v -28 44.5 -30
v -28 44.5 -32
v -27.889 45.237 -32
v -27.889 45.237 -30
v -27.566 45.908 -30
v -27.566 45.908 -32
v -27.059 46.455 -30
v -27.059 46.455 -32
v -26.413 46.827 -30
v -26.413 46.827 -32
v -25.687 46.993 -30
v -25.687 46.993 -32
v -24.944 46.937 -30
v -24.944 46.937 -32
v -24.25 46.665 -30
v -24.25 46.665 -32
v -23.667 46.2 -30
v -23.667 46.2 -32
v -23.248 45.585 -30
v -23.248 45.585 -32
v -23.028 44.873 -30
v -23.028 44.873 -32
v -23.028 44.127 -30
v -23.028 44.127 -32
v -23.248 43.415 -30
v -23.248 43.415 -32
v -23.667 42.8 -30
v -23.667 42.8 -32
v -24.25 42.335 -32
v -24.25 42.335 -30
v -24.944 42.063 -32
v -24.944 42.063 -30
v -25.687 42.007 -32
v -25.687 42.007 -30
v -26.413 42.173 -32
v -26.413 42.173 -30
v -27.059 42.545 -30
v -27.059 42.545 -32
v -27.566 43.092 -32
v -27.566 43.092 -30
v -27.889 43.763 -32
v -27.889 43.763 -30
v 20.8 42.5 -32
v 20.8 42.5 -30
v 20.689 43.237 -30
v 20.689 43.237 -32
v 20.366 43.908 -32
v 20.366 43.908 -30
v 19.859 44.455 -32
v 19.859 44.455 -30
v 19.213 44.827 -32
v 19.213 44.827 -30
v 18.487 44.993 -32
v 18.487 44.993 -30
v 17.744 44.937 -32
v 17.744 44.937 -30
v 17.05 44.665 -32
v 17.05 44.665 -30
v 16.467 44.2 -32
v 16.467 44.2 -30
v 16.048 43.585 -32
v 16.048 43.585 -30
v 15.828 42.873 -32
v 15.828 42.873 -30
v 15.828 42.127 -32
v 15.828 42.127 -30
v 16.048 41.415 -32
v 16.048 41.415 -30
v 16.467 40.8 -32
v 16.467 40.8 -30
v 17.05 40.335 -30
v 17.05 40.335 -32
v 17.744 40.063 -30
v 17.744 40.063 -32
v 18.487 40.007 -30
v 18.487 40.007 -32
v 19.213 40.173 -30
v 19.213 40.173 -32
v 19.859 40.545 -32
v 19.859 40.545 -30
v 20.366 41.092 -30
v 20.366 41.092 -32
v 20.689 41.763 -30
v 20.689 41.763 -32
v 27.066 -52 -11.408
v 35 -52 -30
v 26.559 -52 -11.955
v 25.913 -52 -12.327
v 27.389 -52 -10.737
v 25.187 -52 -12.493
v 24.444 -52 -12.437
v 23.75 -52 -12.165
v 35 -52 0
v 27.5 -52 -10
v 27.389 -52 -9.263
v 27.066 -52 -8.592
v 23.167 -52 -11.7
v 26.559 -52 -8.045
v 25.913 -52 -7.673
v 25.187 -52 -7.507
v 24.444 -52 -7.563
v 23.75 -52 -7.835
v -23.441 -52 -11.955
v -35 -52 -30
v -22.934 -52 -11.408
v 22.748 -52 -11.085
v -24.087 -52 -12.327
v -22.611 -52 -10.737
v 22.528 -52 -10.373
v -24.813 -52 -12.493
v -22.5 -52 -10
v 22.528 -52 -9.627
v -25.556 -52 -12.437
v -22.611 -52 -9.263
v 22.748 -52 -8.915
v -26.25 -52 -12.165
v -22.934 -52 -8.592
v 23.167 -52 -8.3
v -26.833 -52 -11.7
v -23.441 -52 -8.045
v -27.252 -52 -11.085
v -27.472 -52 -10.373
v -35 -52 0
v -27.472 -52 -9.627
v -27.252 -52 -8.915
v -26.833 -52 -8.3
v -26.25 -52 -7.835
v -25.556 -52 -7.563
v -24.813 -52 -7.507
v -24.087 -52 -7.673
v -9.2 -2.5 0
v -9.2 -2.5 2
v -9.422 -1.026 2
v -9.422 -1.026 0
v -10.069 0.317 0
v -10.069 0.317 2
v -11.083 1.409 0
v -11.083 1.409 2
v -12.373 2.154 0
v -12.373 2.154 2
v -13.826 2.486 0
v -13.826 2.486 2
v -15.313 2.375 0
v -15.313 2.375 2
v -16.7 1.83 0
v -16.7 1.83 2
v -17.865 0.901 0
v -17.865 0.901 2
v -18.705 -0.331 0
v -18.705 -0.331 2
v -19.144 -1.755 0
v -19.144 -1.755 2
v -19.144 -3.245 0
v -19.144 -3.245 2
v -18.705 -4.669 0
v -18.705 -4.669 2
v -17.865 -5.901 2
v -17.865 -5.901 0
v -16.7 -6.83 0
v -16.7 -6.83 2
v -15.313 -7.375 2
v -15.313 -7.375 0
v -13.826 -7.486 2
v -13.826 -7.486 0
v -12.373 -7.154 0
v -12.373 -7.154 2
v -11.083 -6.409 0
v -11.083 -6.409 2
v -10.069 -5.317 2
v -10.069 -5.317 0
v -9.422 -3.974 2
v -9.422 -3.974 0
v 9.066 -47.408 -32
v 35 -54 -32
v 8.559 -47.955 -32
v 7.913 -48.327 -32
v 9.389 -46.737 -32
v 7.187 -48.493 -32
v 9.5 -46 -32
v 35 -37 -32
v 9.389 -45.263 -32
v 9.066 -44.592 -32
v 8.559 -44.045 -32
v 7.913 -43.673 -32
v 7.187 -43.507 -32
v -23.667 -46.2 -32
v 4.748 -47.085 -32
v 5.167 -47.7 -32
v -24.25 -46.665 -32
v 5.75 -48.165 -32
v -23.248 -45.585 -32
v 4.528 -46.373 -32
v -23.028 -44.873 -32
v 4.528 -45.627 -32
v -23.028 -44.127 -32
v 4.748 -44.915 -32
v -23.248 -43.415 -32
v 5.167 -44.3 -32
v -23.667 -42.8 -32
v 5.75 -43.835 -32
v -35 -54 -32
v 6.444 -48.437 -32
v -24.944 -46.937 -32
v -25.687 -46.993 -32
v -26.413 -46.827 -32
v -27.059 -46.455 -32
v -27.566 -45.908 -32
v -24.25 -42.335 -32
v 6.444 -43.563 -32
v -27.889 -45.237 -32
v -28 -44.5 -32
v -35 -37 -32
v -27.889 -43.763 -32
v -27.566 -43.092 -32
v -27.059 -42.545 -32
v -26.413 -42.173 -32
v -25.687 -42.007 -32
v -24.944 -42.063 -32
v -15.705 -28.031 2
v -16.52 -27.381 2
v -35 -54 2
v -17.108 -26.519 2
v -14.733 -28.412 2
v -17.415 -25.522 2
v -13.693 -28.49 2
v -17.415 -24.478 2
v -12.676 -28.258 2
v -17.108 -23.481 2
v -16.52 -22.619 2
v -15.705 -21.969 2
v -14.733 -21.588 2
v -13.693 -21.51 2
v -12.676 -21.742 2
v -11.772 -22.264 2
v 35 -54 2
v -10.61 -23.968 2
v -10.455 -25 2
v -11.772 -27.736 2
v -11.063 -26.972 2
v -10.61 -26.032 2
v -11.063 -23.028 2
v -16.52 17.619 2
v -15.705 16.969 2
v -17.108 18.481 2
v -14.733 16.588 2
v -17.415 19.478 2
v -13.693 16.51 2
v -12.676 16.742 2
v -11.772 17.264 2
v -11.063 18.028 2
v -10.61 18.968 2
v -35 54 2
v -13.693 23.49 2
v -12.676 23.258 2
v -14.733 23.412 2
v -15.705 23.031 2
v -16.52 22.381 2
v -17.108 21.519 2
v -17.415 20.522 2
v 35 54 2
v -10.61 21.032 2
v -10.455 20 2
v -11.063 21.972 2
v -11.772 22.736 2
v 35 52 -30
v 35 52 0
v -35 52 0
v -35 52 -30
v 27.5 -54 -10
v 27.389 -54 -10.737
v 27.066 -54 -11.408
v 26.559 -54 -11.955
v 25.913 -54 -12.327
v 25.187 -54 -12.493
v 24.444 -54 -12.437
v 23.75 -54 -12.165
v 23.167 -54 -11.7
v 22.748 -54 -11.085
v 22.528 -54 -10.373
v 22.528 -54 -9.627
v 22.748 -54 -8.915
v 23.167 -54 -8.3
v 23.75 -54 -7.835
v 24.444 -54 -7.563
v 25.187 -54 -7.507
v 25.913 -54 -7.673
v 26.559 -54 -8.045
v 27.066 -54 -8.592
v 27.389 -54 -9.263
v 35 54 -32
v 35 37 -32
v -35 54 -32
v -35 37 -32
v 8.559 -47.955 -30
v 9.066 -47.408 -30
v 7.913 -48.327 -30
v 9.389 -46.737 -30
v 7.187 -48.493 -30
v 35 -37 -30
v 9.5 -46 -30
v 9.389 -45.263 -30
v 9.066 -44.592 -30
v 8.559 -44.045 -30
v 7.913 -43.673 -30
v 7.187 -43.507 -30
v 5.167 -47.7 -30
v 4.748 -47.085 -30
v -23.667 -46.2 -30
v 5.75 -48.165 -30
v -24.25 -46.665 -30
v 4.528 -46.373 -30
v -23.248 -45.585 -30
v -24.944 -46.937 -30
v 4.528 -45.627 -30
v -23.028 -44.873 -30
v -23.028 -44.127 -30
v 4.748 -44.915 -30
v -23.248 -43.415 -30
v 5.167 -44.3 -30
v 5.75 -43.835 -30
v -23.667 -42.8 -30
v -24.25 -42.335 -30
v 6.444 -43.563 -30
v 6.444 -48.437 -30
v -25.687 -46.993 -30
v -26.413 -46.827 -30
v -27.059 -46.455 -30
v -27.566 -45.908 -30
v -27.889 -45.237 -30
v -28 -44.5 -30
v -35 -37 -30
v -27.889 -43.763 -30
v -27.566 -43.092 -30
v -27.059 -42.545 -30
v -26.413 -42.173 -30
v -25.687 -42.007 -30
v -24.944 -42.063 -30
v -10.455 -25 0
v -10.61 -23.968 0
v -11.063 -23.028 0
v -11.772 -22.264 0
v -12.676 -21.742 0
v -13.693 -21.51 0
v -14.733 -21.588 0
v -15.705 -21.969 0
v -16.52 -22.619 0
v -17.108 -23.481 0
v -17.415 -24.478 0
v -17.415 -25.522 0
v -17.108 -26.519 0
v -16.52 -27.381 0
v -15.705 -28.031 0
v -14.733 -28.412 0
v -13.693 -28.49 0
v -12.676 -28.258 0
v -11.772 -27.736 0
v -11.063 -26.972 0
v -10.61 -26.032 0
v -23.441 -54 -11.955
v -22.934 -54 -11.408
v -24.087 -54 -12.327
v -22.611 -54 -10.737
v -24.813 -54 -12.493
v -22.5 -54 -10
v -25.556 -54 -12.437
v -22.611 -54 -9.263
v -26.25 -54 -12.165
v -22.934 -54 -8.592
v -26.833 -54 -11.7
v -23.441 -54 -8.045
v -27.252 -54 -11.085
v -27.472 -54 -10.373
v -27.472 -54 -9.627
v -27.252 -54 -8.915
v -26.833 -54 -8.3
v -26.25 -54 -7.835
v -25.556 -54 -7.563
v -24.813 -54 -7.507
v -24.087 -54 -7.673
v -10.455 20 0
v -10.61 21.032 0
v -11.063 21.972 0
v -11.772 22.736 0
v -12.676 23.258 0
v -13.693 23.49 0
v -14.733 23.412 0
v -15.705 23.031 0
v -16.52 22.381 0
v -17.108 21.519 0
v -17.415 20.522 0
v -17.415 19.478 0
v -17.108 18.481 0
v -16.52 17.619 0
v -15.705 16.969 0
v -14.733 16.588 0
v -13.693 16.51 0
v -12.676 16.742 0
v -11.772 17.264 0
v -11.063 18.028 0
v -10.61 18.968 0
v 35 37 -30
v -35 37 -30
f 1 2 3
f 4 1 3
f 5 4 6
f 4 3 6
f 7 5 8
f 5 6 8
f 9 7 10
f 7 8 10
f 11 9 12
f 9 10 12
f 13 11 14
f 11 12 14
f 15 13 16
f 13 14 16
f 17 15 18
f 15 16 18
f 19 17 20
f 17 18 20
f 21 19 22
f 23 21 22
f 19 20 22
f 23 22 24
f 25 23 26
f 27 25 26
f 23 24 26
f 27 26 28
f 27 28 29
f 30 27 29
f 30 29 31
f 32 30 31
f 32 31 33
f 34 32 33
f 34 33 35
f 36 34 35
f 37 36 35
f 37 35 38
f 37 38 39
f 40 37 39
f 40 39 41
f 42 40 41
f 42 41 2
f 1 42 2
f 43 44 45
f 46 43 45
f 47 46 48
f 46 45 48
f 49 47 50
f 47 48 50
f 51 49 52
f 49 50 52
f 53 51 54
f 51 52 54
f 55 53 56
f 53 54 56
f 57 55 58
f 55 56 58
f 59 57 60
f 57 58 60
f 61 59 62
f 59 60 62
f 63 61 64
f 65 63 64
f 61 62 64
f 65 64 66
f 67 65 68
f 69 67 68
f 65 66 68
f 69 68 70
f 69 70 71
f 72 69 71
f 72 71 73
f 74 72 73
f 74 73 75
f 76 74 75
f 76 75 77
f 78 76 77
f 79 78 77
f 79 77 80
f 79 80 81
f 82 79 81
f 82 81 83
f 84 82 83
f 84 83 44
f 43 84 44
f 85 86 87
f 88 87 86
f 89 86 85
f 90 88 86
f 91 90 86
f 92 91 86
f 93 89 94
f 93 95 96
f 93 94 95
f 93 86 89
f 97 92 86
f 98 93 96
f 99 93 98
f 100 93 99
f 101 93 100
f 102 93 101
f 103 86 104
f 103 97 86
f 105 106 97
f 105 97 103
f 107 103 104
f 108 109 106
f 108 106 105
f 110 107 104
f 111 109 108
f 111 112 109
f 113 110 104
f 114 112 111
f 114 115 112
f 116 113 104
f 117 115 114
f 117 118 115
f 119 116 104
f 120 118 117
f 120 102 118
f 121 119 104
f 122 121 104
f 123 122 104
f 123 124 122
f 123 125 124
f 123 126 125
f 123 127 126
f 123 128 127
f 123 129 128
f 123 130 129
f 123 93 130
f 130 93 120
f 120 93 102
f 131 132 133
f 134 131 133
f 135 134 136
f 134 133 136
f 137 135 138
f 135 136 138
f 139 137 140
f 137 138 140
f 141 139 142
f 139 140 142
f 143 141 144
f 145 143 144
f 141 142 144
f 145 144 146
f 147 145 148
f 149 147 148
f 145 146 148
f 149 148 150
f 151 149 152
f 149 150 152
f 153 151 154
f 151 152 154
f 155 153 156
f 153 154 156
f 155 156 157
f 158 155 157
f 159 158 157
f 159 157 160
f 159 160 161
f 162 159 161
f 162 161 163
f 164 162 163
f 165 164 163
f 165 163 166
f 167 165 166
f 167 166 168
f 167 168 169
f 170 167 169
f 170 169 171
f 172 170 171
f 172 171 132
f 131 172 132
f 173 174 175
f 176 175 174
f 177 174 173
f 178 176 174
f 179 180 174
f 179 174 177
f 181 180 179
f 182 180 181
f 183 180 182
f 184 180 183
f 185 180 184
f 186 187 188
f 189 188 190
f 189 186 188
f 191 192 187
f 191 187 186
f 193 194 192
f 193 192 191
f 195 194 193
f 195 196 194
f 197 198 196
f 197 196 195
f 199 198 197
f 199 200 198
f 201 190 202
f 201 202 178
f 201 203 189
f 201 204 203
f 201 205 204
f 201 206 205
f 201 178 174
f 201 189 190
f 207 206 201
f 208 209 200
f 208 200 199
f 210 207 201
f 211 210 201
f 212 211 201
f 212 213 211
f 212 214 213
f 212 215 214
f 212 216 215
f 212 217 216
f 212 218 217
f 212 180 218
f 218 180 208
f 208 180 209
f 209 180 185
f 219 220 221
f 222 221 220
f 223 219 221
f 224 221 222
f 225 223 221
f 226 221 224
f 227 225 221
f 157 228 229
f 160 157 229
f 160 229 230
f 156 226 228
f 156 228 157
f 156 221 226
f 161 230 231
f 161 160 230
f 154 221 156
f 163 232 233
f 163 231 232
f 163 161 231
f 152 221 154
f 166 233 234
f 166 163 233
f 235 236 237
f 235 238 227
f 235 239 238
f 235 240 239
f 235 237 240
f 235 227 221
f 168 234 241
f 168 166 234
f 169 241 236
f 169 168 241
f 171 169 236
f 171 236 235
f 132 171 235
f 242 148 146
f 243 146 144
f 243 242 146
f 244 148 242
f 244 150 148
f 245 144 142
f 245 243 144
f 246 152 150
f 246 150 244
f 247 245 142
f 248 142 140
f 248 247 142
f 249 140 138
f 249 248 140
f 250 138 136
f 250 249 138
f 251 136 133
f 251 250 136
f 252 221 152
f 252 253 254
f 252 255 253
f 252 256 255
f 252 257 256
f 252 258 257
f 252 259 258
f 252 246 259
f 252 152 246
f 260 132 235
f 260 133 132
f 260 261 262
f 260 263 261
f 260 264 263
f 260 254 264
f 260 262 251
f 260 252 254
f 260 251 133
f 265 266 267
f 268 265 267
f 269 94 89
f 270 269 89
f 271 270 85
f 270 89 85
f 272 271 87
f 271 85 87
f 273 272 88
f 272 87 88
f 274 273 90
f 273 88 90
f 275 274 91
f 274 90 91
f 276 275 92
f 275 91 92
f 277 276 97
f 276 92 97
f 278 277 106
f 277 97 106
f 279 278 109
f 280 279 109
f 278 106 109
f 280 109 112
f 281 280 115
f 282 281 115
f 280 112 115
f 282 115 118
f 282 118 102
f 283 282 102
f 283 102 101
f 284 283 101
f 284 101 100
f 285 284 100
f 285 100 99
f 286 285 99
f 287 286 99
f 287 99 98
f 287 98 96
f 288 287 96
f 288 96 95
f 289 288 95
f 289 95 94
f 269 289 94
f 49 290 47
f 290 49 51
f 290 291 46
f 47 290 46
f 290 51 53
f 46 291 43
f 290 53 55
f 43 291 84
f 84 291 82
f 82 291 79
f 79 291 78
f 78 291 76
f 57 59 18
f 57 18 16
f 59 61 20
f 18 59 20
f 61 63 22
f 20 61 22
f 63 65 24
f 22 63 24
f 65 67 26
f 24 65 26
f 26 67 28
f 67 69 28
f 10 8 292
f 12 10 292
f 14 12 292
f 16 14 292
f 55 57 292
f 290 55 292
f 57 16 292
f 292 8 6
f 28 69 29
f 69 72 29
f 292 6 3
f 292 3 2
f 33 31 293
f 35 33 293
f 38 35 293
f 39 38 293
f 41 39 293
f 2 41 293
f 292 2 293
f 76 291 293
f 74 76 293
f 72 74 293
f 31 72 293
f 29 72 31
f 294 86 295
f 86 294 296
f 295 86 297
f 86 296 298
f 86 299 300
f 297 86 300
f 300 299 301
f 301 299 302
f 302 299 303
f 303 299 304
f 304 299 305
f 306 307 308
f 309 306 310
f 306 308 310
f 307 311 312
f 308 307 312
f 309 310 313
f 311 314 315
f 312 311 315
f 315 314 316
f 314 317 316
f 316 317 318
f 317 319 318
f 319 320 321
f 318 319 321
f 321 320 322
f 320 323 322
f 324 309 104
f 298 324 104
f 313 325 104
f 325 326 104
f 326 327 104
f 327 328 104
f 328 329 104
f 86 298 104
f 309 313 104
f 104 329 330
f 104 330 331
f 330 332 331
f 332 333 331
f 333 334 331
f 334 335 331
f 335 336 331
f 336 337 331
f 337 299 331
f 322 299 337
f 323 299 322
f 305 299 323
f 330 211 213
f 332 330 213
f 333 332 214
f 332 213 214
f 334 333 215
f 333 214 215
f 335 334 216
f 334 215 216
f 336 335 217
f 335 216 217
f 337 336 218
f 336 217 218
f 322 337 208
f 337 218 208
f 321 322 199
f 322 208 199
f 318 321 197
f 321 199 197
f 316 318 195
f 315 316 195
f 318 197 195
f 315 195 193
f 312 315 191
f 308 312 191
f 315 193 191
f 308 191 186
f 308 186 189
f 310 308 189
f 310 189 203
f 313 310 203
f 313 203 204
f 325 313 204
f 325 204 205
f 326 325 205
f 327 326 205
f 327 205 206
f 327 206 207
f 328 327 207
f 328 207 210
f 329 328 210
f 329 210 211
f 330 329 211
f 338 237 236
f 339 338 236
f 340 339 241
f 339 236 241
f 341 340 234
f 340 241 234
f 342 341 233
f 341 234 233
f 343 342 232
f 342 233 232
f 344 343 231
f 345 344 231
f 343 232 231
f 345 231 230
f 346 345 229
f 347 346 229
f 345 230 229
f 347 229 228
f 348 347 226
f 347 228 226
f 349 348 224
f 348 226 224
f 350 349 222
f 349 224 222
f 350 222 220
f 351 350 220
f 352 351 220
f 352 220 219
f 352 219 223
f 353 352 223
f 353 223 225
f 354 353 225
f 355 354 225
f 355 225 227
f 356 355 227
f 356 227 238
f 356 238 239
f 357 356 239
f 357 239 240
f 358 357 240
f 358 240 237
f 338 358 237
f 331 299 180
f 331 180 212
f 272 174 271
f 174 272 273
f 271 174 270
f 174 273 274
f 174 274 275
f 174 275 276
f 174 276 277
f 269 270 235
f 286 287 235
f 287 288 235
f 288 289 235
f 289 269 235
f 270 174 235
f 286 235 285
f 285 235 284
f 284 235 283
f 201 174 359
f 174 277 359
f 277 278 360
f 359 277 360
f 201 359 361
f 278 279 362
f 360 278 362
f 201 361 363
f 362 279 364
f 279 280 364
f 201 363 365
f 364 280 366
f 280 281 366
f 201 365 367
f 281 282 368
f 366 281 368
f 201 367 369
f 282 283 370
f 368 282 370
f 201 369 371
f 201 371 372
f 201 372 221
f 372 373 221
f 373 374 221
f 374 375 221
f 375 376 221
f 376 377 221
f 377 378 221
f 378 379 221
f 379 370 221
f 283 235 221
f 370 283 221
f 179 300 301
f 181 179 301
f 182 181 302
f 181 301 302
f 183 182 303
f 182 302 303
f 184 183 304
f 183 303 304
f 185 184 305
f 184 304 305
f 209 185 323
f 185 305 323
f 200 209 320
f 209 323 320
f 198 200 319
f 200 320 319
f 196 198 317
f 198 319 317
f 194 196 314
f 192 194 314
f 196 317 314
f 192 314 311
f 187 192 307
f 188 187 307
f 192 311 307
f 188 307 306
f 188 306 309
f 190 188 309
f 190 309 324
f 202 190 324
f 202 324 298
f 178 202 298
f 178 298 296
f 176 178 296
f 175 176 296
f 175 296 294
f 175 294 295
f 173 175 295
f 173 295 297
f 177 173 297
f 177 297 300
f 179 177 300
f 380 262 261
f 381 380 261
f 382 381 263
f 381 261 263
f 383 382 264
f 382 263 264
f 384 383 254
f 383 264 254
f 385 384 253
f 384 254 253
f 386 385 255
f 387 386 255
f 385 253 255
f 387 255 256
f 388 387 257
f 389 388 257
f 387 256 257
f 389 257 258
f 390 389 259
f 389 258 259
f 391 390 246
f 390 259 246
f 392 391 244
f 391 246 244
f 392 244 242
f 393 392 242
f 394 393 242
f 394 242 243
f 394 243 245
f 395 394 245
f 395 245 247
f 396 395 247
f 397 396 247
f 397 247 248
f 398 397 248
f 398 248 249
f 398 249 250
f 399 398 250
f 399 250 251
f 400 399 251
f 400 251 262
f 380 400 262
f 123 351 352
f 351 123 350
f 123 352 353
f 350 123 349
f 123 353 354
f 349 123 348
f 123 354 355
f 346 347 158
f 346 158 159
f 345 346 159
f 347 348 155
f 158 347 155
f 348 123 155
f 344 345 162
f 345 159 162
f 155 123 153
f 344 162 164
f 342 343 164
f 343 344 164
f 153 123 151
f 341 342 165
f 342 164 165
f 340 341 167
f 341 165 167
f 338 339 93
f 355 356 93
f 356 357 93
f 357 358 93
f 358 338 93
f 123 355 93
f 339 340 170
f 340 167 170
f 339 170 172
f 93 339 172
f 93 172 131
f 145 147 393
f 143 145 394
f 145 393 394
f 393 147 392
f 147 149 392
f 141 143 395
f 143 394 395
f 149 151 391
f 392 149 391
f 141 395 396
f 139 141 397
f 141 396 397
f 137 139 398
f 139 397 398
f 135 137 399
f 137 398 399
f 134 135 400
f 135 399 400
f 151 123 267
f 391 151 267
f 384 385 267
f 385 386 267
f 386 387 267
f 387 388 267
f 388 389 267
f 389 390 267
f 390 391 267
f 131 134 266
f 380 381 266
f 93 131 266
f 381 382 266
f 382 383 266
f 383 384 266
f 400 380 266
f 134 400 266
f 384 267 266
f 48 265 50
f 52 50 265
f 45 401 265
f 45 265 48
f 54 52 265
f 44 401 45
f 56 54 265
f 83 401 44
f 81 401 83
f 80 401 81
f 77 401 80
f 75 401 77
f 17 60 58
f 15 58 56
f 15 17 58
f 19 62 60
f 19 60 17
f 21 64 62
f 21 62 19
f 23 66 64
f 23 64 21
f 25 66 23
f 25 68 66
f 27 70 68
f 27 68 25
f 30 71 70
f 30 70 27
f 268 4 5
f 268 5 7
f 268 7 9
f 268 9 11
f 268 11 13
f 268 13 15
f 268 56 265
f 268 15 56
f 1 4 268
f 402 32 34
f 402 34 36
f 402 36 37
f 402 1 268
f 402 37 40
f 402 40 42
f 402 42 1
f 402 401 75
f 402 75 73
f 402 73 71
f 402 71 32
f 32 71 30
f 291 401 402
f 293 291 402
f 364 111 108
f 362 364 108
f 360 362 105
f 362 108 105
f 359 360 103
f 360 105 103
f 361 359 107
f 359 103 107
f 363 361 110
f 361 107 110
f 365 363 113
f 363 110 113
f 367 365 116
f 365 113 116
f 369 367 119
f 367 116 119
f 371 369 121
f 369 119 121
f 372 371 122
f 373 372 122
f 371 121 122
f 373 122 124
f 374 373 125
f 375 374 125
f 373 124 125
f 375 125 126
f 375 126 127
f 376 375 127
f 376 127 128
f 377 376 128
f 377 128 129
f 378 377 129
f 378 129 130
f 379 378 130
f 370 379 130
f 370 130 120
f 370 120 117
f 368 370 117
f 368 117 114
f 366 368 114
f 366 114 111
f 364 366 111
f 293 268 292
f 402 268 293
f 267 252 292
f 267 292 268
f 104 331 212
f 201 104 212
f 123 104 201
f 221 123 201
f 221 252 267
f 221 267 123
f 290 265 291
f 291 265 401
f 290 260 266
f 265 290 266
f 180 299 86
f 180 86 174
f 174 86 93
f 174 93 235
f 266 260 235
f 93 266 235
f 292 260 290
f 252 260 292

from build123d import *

# Parameters (mm, degrees)
ESBO_O1_W                = 70
ESBO_O1_H                = 108
RESSALTO_EXTRUS_O1_DEPTH = 2
ESBO_O2_W                = 70
ESBO_O2_H                = 2
RESSALTO_EXTRUS_O2_DEPTH = 30
ESBO_O3_W                = 70
ESBO_O3_H                = 17
RESSALTO_EXTRUS_O3_DEPTH = 2
ESBO_O4_R                = 2.5
CORTE_EXTRUS_O1_DEPTH    = 10
ESBO_O8_R                = 2.5
CORTE_EXTRUS_O5_DEPTH    = 10
ESBO_O9_R                = 5
CORTE_EXTRUS_O6_DEPTH    = 10
ESBO_O15_R               = 3.5
CORTE_EXTRUS_O7_DEPTH    = 10
CUT_EXTRUDE1_REACH       = 36
SKETCH1_R                = 2.5


with BuildPart() as part:
    # Esboço1 → Ressalto-extrusão1 (new body)
    with BuildSketch(Plane.XY):
        Rectangle(ESBO_O1_W, ESBO_O1_H)
    extrude(amount=RESSALTO_EXTRUS_O1_DEPTH)

    # Esboço2 → Ressalto-extrusão2 (add)
    with BuildSketch(Plane(origin=(0, 0, 0), x_dir=(-1, 0, 0), z_dir=(0, 0, -1))):
        with Locations((0, -53)):
            Rectangle(ESBO_O2_W, ESBO_O2_H)
    ressalto_extrus_o2 = extrude(amount=RESSALTO_EXTRUS_O2_DEPTH)

    # Esboço3 → Ressalto-extrusão3 (add)
    with BuildSketch(Plane(origin=(0, 0, -30), x_dir=(-1, 0, 0), z_dir=(0, 0, -1))):
        with Locations((0, -45.5)):
            Rectangle(ESBO_O3_W, ESBO_O3_H)
    ressalto_extrus_o3 = extrude(amount=RESSALTO_EXTRUS_O3_DEPTH)

    # Espelhar1: Ressalto-extrusão2, Ressalto-extrusão3 across plane
    add(ressalto_extrus_o2.mirror(Plane.ZX))
    add(ressalto_extrus_o3.mirror(Plane.ZX))

    # Esboço4 → Corte-extrusão1 (cut)
    with BuildSketch(Plane.XY.offset(-30)):
        with Locations((7, -46)):
            Circle(ESBO_O4_R)
        with Locations((18.3, 42.5)):
            Circle(ESBO_O4_R)
    extrude(amount=-CORTE_EXTRUS_O1_DEPTH, mode=Mode.SUBTRACT)

    # Esboço8 → Corte-extrusão5 (cut)
    with BuildSketch(Plane(origin=(0, -52, 0), x_dir=(1, 0, 0), z_dir=(0, 1, 0))):
        with Locations((25, 10)):
            Circle(ESBO_O8_R)
        with Locations((-25, 10)):
            Circle(ESBO_O8_R)
    extrude(amount=-CORTE_EXTRUS_O5_DEPTH, mode=Mode.SUBTRACT)

    # Esboço9 → Corte-extrusão6 (cut)
    with BuildSketch(Plane.XY.offset(2)):
        with Locations((-14.2, -2.5)):
            Circle(ESBO_O9_R)
    extrude(amount=-CORTE_EXTRUS_O6_DEPTH, mode=Mode.SUBTRACT)

    # Esboço15 → Corte-extrusão7 (cut)
    with BuildSketch(Plane.XY.offset(2)):
        with Locations((-13.954549257, 20)):
            Circle(ESBO_O15_R)
        with Locations((-13.954549257, -25)):
            Circle(ESBO_O15_R)
    extrude(amount=-CORTE_EXTRUS_O7_DEPTH, mode=Mode.SUBTRACT)

    # Sketch1 → Cut-Extrude1 (cut, up to next)
    with BuildSketch(Plane(origin=(0, 0, -32), x_dir=(-1, 0, 0), z_dir=(0, 0, -1)), mode=Mode.PRIVATE) as cut_extrude1_sk1:
        with Locations((25.5, 44.5)):
            Circle(SKETCH1_R)
    cut_extrude1_tool1 = extrude(cut_extrude1_sk1.sketch, amount=-CUT_EXTRUDE1_REACH, mode=Mode.PRIVATE) & part.part
    add(cut_extrude1_tool1.solids().sort_by_distance((-25.5, 44.5, -32))[0], mode=Mode.SUBTRACT)
    # Sketch1 → Cut-Extrude1 (cut, up to next)
    with BuildSketch(Plane(origin=(0, 0, -32), x_dir=(-1, 0, 0), z_dir=(0, 0, -1)), mode=Mode.PRIVATE) as cut_extrude1_sk2:
        with Locations((25.5, -44.5)):
            Circle(SKETCH1_R)
    cut_extrude1_tool2 = extrude(cut_extrude1_sk2.sketch, amount=-CUT_EXTRUDE1_REACH, mode=Mode.PRIVATE) & part.part
    add(cut_extrude1_tool2.solids().sort_by_distance((-25.5, -44.5, -32))[0], mode=Mode.SUBTRACT)


solid = part.part
